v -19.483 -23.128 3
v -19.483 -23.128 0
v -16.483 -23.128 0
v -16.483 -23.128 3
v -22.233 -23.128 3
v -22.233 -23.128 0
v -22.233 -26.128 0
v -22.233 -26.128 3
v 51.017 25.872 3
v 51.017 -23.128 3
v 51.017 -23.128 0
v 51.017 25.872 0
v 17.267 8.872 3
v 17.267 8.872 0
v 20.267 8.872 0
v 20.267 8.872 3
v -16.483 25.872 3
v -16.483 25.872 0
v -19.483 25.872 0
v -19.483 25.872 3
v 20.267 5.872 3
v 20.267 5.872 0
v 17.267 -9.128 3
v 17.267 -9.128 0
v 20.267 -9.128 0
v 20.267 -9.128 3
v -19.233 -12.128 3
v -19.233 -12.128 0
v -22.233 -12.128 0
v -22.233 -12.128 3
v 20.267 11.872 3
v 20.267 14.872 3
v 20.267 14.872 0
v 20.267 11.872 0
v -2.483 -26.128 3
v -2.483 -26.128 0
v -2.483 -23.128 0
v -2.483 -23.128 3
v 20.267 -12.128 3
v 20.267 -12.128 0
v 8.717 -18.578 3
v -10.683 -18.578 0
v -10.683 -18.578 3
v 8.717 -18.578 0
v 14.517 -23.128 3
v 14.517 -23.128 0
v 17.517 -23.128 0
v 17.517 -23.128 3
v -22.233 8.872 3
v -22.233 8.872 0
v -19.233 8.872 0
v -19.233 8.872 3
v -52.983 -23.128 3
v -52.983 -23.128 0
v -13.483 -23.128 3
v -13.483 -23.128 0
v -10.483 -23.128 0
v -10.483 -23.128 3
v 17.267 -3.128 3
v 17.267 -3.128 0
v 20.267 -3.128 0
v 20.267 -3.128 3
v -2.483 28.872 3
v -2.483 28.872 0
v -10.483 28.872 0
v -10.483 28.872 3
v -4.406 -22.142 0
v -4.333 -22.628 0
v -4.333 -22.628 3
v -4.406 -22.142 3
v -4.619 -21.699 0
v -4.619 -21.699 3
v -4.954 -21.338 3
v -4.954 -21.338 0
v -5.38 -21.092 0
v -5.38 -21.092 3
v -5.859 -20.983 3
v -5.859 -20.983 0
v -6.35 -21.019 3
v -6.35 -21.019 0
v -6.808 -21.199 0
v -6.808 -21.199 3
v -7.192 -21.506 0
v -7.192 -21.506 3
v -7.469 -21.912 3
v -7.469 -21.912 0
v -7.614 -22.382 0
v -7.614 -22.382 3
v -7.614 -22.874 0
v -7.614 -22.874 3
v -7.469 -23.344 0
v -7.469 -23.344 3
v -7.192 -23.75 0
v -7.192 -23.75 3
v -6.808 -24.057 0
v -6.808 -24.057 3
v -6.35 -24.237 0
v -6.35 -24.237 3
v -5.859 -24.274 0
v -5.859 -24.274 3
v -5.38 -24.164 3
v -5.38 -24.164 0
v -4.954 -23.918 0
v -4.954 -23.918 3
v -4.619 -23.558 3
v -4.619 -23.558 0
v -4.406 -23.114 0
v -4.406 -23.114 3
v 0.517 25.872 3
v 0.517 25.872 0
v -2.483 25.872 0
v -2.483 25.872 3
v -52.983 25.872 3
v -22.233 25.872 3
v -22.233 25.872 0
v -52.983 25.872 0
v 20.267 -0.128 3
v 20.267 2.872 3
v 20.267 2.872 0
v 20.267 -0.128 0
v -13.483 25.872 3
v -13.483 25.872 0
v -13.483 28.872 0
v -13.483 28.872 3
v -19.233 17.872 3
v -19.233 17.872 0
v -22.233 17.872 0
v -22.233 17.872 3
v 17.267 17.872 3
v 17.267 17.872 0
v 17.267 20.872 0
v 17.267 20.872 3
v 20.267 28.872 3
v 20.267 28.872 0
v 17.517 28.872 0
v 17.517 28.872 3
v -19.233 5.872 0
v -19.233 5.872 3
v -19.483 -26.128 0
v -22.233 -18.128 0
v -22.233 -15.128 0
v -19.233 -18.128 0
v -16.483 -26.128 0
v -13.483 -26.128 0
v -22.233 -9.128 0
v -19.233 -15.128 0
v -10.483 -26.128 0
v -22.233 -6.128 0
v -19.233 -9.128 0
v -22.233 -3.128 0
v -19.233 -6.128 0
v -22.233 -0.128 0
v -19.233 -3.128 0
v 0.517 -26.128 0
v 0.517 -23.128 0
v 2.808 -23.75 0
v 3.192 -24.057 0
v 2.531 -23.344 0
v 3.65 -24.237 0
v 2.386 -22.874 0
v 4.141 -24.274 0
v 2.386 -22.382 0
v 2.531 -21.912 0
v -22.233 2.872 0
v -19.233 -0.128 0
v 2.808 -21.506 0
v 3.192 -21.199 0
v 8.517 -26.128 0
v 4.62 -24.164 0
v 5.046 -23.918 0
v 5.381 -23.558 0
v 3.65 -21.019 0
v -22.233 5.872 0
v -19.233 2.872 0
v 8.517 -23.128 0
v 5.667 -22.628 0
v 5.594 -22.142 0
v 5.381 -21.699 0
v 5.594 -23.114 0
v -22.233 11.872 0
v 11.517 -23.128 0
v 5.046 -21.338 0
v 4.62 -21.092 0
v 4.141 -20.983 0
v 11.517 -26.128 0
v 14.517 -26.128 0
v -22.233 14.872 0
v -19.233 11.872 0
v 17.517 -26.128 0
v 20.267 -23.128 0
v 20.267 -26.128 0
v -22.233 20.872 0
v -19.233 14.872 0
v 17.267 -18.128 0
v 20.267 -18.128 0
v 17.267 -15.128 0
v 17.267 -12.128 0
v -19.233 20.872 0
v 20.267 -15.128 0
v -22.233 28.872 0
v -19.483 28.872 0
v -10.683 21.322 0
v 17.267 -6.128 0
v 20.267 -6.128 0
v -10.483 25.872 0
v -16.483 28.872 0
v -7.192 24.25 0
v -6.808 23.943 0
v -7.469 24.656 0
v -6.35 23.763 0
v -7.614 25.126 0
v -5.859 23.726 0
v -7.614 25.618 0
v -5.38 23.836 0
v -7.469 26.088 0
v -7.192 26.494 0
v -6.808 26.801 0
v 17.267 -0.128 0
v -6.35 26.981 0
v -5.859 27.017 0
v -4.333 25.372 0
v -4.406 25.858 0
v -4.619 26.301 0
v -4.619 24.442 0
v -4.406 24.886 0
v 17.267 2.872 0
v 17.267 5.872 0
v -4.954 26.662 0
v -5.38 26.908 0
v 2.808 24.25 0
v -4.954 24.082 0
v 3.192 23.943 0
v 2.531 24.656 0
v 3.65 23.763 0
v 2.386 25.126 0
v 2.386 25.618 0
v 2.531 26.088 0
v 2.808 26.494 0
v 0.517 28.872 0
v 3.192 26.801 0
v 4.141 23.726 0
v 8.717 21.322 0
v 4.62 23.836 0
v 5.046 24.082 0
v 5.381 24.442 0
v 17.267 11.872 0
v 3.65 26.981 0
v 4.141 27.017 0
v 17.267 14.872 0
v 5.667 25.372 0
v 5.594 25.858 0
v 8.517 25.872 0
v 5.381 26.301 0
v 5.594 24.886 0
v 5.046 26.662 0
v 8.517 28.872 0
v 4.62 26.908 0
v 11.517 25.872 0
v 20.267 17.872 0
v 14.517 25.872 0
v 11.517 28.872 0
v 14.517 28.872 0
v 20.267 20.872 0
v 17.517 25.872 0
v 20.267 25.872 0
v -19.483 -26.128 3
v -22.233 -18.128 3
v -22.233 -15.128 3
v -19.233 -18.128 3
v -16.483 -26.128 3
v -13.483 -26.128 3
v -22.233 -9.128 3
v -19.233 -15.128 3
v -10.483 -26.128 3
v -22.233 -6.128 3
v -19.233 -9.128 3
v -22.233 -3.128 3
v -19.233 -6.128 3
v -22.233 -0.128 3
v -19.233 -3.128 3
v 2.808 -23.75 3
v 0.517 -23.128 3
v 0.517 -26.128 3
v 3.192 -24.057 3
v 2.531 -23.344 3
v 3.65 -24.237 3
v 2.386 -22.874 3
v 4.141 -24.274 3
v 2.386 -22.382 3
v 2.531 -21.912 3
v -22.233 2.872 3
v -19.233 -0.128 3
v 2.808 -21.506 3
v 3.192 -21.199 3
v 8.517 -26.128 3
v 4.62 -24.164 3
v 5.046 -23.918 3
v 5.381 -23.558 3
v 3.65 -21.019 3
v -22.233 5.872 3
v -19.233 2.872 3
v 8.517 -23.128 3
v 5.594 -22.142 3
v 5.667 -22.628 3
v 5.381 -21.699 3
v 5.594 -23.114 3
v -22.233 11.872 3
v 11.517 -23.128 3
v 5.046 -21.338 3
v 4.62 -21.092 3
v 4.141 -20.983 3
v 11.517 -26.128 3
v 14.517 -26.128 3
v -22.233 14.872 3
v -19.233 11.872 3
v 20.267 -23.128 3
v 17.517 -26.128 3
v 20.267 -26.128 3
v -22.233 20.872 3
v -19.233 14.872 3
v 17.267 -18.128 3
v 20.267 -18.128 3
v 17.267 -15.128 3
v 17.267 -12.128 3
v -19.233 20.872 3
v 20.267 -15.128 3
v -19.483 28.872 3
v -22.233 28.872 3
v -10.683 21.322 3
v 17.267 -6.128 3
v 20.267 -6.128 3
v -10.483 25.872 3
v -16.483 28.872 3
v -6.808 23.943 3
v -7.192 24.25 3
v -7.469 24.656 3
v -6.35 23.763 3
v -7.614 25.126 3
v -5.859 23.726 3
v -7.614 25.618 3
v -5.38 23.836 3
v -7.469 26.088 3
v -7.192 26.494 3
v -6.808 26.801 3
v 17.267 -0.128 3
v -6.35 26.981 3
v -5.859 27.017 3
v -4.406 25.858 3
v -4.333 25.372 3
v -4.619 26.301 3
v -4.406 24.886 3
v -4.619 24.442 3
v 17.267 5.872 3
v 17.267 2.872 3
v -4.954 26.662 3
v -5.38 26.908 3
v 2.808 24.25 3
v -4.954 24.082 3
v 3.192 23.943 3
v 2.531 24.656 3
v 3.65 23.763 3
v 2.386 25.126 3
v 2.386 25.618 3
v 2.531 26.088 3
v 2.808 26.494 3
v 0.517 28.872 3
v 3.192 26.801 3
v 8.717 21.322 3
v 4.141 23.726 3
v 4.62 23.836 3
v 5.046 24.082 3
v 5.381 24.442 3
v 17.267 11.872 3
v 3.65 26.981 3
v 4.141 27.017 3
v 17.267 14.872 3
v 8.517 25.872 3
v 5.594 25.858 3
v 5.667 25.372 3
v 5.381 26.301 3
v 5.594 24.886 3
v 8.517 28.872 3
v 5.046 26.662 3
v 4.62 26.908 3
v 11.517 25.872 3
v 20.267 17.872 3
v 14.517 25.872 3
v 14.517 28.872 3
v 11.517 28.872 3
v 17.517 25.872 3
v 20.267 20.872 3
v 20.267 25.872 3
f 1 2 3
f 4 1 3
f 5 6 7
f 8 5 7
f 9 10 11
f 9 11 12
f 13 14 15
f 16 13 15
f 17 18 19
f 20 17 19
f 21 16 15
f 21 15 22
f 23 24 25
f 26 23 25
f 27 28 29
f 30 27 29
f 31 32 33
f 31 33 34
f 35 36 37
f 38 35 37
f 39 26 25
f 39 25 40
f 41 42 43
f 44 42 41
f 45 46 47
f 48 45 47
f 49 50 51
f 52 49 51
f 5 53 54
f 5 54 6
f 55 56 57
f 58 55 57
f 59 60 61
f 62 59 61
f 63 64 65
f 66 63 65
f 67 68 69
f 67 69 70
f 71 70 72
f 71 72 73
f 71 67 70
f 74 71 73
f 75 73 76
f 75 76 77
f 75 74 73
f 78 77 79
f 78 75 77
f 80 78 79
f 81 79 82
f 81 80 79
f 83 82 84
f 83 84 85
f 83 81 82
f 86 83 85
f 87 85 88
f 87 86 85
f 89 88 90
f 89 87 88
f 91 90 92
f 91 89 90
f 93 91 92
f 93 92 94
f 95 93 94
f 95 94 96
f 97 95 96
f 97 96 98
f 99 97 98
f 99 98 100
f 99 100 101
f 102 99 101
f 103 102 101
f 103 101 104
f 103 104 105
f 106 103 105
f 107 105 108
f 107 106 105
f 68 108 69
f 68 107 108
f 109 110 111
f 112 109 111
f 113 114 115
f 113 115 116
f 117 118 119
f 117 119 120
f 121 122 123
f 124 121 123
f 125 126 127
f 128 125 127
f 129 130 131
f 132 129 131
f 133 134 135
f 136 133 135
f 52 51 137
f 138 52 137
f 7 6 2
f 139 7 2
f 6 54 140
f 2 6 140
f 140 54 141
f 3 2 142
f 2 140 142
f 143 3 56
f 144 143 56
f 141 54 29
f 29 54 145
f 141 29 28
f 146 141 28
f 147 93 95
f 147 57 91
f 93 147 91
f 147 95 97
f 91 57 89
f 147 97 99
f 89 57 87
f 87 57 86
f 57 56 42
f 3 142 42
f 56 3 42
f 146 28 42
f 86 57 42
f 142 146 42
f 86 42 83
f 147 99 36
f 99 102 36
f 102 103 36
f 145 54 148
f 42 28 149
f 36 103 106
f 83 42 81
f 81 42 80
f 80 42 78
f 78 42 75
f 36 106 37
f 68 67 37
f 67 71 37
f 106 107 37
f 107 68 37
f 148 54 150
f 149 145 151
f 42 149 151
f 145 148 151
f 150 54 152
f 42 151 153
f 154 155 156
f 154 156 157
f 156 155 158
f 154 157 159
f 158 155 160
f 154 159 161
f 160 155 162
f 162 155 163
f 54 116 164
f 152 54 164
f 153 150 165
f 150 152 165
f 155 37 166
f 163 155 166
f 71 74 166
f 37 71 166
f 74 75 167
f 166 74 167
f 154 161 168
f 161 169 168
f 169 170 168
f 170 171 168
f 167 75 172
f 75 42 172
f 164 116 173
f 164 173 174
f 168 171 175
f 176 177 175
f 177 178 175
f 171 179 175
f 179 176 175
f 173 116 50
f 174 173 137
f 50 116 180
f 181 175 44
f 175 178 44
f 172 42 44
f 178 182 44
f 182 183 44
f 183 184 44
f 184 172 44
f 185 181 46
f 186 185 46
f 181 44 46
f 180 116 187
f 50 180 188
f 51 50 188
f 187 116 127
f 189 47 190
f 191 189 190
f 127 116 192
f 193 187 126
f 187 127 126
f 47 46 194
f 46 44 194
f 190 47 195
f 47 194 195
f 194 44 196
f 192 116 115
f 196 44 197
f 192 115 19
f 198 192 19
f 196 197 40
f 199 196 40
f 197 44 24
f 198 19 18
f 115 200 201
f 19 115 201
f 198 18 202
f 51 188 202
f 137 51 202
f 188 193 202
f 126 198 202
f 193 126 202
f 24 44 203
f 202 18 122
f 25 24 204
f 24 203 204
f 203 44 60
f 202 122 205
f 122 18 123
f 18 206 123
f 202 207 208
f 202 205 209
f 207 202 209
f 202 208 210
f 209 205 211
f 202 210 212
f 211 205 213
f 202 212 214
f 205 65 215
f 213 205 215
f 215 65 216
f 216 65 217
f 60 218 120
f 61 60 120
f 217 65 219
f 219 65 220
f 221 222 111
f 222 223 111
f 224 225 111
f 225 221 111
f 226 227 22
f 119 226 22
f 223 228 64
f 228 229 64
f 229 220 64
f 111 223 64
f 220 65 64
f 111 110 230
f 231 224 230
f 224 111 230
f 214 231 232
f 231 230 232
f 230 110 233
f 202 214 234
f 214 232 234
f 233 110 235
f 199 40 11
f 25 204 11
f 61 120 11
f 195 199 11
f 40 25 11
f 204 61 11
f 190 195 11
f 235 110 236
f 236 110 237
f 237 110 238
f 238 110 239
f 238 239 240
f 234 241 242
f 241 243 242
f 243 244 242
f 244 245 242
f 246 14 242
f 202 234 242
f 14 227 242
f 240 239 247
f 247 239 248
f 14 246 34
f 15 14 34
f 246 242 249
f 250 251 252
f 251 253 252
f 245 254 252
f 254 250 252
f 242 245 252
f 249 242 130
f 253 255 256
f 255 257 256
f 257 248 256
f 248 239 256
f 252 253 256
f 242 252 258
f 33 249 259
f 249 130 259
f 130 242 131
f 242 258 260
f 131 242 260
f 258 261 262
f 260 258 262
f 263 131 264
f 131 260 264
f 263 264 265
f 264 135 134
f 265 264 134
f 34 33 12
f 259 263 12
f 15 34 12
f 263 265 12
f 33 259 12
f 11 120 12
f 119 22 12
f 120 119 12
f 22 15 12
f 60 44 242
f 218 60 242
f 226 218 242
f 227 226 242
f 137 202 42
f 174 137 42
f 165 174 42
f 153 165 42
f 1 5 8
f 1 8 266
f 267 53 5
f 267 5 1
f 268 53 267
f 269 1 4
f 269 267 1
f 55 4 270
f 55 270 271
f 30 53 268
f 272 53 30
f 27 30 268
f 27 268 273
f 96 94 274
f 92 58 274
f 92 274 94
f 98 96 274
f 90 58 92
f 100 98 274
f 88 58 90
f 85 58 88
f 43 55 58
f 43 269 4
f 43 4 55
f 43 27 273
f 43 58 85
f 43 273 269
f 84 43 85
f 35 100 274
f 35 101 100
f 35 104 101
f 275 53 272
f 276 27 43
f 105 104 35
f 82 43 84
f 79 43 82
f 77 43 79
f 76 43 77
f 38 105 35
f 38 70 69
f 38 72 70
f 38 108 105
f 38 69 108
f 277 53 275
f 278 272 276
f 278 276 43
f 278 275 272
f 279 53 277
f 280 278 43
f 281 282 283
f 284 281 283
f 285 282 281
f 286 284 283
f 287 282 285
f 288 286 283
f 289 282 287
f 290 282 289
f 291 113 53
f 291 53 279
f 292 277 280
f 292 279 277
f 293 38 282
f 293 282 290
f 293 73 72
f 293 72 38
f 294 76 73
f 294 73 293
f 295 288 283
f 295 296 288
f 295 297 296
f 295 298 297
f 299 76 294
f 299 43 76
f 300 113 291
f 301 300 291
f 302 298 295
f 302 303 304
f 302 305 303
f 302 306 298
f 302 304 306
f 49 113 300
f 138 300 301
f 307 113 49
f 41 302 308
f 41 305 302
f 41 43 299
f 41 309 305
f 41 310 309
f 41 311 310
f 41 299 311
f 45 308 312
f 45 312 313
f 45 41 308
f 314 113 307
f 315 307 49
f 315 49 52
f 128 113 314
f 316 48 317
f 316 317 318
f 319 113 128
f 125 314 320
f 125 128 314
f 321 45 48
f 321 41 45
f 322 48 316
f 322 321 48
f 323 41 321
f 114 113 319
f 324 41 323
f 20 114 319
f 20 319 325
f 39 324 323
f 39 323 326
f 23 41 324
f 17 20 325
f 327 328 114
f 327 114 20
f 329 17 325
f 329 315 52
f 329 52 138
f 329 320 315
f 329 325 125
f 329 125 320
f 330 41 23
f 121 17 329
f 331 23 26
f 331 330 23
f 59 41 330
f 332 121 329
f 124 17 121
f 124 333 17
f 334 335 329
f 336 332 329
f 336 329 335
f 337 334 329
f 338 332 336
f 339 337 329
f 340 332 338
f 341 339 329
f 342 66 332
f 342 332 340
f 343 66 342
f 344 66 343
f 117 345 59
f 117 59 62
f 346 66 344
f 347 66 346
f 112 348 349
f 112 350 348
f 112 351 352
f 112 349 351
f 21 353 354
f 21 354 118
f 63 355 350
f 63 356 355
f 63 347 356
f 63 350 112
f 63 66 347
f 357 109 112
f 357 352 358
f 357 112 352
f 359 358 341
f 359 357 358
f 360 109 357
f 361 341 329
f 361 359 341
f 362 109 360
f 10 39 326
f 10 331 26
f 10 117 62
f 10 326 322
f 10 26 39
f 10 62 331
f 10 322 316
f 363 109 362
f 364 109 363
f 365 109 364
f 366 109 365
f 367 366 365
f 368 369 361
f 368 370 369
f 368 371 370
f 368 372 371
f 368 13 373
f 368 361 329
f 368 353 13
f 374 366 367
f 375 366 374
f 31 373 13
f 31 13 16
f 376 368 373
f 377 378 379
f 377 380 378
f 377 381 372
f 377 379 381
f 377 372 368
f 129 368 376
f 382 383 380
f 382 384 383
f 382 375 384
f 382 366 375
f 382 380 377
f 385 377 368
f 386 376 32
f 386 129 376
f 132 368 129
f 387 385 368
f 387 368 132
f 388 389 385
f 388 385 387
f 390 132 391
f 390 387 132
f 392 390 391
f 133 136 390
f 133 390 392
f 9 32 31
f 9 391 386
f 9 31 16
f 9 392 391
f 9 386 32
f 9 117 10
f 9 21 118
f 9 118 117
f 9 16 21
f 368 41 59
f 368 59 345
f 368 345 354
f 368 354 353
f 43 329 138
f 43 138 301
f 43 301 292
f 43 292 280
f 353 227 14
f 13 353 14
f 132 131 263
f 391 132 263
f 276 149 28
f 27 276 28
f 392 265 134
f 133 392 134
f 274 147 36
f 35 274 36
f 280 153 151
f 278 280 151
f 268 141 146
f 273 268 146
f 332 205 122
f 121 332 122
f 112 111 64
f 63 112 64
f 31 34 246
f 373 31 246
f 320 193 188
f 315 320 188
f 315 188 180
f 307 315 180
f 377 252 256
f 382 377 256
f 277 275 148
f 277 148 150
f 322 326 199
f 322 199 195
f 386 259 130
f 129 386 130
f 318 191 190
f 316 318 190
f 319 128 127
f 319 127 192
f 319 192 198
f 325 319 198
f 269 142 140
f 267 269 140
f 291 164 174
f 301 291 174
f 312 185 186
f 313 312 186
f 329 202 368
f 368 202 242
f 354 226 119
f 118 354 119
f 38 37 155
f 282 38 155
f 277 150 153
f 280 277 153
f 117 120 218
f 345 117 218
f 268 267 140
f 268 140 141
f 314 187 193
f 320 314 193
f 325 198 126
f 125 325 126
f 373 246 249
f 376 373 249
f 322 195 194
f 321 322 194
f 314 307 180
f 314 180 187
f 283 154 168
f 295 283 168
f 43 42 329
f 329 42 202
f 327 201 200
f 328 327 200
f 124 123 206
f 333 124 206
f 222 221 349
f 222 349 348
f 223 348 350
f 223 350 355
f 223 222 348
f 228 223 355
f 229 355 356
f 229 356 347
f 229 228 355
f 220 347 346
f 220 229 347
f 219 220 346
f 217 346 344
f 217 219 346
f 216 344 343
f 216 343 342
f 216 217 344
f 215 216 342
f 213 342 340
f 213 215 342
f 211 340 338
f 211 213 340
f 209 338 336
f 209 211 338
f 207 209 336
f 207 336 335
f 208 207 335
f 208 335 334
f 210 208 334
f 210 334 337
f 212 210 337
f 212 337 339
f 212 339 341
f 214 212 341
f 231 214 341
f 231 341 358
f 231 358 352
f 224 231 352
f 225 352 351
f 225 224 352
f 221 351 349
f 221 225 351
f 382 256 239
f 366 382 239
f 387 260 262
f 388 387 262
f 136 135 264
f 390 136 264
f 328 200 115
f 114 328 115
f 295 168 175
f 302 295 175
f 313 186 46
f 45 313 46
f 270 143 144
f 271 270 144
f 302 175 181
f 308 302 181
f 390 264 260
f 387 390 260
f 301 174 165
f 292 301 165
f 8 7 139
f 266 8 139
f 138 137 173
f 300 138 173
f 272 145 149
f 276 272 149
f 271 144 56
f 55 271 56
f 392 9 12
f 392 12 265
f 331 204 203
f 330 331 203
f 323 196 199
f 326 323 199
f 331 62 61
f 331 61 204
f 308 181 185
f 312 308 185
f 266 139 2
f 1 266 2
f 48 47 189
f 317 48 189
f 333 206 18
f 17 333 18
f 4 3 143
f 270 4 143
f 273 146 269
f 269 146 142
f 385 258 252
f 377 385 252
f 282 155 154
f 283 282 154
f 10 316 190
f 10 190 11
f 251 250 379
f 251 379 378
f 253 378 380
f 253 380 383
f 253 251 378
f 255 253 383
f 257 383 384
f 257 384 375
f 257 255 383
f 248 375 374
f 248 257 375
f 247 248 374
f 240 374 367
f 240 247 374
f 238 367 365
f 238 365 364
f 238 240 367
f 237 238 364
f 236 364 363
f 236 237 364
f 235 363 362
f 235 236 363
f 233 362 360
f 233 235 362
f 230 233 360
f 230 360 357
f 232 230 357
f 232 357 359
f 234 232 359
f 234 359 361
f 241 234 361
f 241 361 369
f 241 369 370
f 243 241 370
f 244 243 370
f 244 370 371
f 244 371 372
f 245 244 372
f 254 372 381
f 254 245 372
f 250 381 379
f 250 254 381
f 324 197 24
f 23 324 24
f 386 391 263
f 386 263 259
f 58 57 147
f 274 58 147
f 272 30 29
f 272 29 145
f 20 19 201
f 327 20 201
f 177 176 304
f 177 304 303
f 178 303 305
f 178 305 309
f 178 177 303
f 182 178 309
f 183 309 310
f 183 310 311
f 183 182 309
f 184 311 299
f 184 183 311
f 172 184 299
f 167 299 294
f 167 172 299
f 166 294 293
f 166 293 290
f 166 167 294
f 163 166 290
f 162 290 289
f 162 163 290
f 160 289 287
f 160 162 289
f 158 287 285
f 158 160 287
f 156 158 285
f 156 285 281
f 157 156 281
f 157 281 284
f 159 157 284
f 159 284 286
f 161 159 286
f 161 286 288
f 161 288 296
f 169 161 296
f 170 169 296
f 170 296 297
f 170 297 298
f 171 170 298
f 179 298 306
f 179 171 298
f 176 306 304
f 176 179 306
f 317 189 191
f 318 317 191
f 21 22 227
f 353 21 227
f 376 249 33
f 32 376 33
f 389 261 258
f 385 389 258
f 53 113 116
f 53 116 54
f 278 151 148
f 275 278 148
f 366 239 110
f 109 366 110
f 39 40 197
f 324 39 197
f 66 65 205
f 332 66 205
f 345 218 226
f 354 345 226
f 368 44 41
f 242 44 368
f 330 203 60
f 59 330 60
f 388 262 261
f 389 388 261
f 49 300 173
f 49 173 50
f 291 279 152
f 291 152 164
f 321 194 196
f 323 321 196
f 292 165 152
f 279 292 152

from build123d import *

# Parameters (mm, degrees)
F0_R     = 1.65
F0_W     = 19.4
F0_H     = 39.9
F1_DEPTH = 3
F3_DEPTH = 3


with BuildPart() as f1:
    # F0 (on Top) → F1 (new body)
    with BuildSketch(Plane.XY):
        Polygon((17.517377, -26.128115), (20.267377, -26.128115), (20.267377, -18.128115), (17.267377, -18.128115), (17.267377, -15.128115), (20.267377, -15.128115), (20.267377, -12.128115), (17.267377, -12.128115), (17.267377, -9.128115), (20.267377, -9.128115), (20.267377, -6.128115), (17.267377, -6.128115), (17.267377, -3.128115), (20.267377, -3.128115), (20.267377, -0.128115), (17.267377, -0.128115), (17.267377, 2.871885), (20.267377, 2.871885), (20.267377, 5.871885), (17.267377, 5.871885), (17.267377, 8.871885), (20.267377, 8.871885), (20.267377, 11.871885), (17.267377, 11.871885), (17.267377, 14.871885), (20.267377, 14.871885), (20.267377, 17.871885), (17.267377, 17.871885), (17.267377, 20.871885), (20.267377, 20.871885), (20.267377, 28.871885), (17.517377, 28.871885), (17.517377, 25.871885), (14.517377, 25.871885), (14.517377, 28.871885), (11.517377, 28.871885), (11.517377, 25.871885), (8.517377, 25.871885), (8.517377, 28.871885), (0.517377, 28.871885), (0.517377, 25.871885), (-2.482623, 25.871885), (-2.482623, 28.871885), (-10.482623, 28.871885), (-10.482623, 25.871885), (-13.482623, 25.871885), (-13.482623, 28.871885), (-16.482623, 28.871885), (-16.482623, 25.871885), (-19.482623, 25.871885), (-19.482623, 28.871885), (-22.232623, 28.871885), (-22.232623, 20.871885), (-19.232623, 20.871885), (-19.232623, 17.871885), (-22.232623, 17.871885), (-22.232623, 14.871885), (-19.232623, 14.871885), (-19.232623, 11.871885), (-22.232623, 11.871885), (-22.232623, 8.871885), (-19.232623, 8.871885), (-19.232623, 5.871885), (-22.232623, 5.871885), (-22.232623, 2.871885), (-19.232623, 2.871885), (-19.232623, -0.128115), (-22.232623, -0.128115), (-22.232623, -3.128115), (-19.232623, -3.128115), (-19.232623, -6.128115), (-22.232623, -6.128115), (-22.232623, -9.128115), (-19.232623, -9.128115), (-19.232623, -12.128115), (-22.232623, -12.128115), (-22.232623, -15.128115), (-19.232623, -15.128115), (-19.232623, -18.128115), (-22.232623, -18.128115), (-22.232623, -26.128115), (-19.482623, -26.128115), (-19.482623, -23.128115), (-16.482623, -23.128115), (-16.482623, -26.128115), (-13.482623, -26.128115), (-13.482623, -23.128115), (-10.482623, -23.128115), (-10.482623, -26.128115), (-2.482623, -26.128115), (-2.482623, -23.128115), (0.517377, -23.128115), (0.517377, -26.128115), (8.517377, -26.128115), (8.517377, -23.128115), (11.517377, -23.128115), (11.517377, -26.128115), (14.517377, -26.128115), (14.517377, -23.128115), (17.517377, -23.128115), align=None)
        with Locations((-5.982623, -22.628115)):
            Circle(F0_R, mode=Mode.SUBTRACT)
        with Locations((4.017377, -22.628115)):
            Circle(F0_R, mode=Mode.SUBTRACT)
        with Locations((-0.982623, 1.371885)):
            Rectangle(F0_W, F0_H, mode=Mode.SUBTRACT)
        with Locations((-5.982623, 25.371885)):
            Circle(F0_R, mode=Mode.SUBTRACT)
        with Locations((4.017377, 25.371885)):
            Circle(F0_R, mode=Mode.SUBTRACT)
    extrude(amount=F1_DEPTH)

    # F2 (on face) → F3 (join)
    with BuildSketch(Plane.XY.offset(3)):
        Polygon((-52.982623, -23.128115), (-22.232623, -23.128115), (-22.232623, -18.128115), (-22.232623, -15.128115), (-22.232623, -12.128115), (-22.232623, -9.128115), (-22.232623, -6.128115), (-22.232623, -3.128115), (-22.232623, -0.128115), (-22.232623, 2.871885), (-22.232623, 5.871885), (-22.232623, 8.871885), (-22.232623, 11.871885), (-22.232623, 14.871885), (-22.232623, 17.871885), (-22.232623, 20.871885), (-22.232623, 25.871885), (-52.982623, 25.871885), align=None)
        Polygon((20.267377, -18.128115), (20.267377, -23.128115), (51.017377, -23.128115), (51.017377, 25.871885), (20.267377, 25.871885), (20.267377, 20.871885), (20.267377, 17.871885), (20.267377, 14.871885), (20.267377, 11.871885), (20.267377, 8.871885), (20.267377, 5.871885), (20.267377, 2.871885), (20.267377, -0.128115), (20.267377, -3.128115), (20.267377, -6.128115), (20.267377, -9.128115), (20.267377, -12.128115), (20.267377, -15.128115), align=None)
    extrude(amount=-F3_DEPTH)


solid = f1.part
